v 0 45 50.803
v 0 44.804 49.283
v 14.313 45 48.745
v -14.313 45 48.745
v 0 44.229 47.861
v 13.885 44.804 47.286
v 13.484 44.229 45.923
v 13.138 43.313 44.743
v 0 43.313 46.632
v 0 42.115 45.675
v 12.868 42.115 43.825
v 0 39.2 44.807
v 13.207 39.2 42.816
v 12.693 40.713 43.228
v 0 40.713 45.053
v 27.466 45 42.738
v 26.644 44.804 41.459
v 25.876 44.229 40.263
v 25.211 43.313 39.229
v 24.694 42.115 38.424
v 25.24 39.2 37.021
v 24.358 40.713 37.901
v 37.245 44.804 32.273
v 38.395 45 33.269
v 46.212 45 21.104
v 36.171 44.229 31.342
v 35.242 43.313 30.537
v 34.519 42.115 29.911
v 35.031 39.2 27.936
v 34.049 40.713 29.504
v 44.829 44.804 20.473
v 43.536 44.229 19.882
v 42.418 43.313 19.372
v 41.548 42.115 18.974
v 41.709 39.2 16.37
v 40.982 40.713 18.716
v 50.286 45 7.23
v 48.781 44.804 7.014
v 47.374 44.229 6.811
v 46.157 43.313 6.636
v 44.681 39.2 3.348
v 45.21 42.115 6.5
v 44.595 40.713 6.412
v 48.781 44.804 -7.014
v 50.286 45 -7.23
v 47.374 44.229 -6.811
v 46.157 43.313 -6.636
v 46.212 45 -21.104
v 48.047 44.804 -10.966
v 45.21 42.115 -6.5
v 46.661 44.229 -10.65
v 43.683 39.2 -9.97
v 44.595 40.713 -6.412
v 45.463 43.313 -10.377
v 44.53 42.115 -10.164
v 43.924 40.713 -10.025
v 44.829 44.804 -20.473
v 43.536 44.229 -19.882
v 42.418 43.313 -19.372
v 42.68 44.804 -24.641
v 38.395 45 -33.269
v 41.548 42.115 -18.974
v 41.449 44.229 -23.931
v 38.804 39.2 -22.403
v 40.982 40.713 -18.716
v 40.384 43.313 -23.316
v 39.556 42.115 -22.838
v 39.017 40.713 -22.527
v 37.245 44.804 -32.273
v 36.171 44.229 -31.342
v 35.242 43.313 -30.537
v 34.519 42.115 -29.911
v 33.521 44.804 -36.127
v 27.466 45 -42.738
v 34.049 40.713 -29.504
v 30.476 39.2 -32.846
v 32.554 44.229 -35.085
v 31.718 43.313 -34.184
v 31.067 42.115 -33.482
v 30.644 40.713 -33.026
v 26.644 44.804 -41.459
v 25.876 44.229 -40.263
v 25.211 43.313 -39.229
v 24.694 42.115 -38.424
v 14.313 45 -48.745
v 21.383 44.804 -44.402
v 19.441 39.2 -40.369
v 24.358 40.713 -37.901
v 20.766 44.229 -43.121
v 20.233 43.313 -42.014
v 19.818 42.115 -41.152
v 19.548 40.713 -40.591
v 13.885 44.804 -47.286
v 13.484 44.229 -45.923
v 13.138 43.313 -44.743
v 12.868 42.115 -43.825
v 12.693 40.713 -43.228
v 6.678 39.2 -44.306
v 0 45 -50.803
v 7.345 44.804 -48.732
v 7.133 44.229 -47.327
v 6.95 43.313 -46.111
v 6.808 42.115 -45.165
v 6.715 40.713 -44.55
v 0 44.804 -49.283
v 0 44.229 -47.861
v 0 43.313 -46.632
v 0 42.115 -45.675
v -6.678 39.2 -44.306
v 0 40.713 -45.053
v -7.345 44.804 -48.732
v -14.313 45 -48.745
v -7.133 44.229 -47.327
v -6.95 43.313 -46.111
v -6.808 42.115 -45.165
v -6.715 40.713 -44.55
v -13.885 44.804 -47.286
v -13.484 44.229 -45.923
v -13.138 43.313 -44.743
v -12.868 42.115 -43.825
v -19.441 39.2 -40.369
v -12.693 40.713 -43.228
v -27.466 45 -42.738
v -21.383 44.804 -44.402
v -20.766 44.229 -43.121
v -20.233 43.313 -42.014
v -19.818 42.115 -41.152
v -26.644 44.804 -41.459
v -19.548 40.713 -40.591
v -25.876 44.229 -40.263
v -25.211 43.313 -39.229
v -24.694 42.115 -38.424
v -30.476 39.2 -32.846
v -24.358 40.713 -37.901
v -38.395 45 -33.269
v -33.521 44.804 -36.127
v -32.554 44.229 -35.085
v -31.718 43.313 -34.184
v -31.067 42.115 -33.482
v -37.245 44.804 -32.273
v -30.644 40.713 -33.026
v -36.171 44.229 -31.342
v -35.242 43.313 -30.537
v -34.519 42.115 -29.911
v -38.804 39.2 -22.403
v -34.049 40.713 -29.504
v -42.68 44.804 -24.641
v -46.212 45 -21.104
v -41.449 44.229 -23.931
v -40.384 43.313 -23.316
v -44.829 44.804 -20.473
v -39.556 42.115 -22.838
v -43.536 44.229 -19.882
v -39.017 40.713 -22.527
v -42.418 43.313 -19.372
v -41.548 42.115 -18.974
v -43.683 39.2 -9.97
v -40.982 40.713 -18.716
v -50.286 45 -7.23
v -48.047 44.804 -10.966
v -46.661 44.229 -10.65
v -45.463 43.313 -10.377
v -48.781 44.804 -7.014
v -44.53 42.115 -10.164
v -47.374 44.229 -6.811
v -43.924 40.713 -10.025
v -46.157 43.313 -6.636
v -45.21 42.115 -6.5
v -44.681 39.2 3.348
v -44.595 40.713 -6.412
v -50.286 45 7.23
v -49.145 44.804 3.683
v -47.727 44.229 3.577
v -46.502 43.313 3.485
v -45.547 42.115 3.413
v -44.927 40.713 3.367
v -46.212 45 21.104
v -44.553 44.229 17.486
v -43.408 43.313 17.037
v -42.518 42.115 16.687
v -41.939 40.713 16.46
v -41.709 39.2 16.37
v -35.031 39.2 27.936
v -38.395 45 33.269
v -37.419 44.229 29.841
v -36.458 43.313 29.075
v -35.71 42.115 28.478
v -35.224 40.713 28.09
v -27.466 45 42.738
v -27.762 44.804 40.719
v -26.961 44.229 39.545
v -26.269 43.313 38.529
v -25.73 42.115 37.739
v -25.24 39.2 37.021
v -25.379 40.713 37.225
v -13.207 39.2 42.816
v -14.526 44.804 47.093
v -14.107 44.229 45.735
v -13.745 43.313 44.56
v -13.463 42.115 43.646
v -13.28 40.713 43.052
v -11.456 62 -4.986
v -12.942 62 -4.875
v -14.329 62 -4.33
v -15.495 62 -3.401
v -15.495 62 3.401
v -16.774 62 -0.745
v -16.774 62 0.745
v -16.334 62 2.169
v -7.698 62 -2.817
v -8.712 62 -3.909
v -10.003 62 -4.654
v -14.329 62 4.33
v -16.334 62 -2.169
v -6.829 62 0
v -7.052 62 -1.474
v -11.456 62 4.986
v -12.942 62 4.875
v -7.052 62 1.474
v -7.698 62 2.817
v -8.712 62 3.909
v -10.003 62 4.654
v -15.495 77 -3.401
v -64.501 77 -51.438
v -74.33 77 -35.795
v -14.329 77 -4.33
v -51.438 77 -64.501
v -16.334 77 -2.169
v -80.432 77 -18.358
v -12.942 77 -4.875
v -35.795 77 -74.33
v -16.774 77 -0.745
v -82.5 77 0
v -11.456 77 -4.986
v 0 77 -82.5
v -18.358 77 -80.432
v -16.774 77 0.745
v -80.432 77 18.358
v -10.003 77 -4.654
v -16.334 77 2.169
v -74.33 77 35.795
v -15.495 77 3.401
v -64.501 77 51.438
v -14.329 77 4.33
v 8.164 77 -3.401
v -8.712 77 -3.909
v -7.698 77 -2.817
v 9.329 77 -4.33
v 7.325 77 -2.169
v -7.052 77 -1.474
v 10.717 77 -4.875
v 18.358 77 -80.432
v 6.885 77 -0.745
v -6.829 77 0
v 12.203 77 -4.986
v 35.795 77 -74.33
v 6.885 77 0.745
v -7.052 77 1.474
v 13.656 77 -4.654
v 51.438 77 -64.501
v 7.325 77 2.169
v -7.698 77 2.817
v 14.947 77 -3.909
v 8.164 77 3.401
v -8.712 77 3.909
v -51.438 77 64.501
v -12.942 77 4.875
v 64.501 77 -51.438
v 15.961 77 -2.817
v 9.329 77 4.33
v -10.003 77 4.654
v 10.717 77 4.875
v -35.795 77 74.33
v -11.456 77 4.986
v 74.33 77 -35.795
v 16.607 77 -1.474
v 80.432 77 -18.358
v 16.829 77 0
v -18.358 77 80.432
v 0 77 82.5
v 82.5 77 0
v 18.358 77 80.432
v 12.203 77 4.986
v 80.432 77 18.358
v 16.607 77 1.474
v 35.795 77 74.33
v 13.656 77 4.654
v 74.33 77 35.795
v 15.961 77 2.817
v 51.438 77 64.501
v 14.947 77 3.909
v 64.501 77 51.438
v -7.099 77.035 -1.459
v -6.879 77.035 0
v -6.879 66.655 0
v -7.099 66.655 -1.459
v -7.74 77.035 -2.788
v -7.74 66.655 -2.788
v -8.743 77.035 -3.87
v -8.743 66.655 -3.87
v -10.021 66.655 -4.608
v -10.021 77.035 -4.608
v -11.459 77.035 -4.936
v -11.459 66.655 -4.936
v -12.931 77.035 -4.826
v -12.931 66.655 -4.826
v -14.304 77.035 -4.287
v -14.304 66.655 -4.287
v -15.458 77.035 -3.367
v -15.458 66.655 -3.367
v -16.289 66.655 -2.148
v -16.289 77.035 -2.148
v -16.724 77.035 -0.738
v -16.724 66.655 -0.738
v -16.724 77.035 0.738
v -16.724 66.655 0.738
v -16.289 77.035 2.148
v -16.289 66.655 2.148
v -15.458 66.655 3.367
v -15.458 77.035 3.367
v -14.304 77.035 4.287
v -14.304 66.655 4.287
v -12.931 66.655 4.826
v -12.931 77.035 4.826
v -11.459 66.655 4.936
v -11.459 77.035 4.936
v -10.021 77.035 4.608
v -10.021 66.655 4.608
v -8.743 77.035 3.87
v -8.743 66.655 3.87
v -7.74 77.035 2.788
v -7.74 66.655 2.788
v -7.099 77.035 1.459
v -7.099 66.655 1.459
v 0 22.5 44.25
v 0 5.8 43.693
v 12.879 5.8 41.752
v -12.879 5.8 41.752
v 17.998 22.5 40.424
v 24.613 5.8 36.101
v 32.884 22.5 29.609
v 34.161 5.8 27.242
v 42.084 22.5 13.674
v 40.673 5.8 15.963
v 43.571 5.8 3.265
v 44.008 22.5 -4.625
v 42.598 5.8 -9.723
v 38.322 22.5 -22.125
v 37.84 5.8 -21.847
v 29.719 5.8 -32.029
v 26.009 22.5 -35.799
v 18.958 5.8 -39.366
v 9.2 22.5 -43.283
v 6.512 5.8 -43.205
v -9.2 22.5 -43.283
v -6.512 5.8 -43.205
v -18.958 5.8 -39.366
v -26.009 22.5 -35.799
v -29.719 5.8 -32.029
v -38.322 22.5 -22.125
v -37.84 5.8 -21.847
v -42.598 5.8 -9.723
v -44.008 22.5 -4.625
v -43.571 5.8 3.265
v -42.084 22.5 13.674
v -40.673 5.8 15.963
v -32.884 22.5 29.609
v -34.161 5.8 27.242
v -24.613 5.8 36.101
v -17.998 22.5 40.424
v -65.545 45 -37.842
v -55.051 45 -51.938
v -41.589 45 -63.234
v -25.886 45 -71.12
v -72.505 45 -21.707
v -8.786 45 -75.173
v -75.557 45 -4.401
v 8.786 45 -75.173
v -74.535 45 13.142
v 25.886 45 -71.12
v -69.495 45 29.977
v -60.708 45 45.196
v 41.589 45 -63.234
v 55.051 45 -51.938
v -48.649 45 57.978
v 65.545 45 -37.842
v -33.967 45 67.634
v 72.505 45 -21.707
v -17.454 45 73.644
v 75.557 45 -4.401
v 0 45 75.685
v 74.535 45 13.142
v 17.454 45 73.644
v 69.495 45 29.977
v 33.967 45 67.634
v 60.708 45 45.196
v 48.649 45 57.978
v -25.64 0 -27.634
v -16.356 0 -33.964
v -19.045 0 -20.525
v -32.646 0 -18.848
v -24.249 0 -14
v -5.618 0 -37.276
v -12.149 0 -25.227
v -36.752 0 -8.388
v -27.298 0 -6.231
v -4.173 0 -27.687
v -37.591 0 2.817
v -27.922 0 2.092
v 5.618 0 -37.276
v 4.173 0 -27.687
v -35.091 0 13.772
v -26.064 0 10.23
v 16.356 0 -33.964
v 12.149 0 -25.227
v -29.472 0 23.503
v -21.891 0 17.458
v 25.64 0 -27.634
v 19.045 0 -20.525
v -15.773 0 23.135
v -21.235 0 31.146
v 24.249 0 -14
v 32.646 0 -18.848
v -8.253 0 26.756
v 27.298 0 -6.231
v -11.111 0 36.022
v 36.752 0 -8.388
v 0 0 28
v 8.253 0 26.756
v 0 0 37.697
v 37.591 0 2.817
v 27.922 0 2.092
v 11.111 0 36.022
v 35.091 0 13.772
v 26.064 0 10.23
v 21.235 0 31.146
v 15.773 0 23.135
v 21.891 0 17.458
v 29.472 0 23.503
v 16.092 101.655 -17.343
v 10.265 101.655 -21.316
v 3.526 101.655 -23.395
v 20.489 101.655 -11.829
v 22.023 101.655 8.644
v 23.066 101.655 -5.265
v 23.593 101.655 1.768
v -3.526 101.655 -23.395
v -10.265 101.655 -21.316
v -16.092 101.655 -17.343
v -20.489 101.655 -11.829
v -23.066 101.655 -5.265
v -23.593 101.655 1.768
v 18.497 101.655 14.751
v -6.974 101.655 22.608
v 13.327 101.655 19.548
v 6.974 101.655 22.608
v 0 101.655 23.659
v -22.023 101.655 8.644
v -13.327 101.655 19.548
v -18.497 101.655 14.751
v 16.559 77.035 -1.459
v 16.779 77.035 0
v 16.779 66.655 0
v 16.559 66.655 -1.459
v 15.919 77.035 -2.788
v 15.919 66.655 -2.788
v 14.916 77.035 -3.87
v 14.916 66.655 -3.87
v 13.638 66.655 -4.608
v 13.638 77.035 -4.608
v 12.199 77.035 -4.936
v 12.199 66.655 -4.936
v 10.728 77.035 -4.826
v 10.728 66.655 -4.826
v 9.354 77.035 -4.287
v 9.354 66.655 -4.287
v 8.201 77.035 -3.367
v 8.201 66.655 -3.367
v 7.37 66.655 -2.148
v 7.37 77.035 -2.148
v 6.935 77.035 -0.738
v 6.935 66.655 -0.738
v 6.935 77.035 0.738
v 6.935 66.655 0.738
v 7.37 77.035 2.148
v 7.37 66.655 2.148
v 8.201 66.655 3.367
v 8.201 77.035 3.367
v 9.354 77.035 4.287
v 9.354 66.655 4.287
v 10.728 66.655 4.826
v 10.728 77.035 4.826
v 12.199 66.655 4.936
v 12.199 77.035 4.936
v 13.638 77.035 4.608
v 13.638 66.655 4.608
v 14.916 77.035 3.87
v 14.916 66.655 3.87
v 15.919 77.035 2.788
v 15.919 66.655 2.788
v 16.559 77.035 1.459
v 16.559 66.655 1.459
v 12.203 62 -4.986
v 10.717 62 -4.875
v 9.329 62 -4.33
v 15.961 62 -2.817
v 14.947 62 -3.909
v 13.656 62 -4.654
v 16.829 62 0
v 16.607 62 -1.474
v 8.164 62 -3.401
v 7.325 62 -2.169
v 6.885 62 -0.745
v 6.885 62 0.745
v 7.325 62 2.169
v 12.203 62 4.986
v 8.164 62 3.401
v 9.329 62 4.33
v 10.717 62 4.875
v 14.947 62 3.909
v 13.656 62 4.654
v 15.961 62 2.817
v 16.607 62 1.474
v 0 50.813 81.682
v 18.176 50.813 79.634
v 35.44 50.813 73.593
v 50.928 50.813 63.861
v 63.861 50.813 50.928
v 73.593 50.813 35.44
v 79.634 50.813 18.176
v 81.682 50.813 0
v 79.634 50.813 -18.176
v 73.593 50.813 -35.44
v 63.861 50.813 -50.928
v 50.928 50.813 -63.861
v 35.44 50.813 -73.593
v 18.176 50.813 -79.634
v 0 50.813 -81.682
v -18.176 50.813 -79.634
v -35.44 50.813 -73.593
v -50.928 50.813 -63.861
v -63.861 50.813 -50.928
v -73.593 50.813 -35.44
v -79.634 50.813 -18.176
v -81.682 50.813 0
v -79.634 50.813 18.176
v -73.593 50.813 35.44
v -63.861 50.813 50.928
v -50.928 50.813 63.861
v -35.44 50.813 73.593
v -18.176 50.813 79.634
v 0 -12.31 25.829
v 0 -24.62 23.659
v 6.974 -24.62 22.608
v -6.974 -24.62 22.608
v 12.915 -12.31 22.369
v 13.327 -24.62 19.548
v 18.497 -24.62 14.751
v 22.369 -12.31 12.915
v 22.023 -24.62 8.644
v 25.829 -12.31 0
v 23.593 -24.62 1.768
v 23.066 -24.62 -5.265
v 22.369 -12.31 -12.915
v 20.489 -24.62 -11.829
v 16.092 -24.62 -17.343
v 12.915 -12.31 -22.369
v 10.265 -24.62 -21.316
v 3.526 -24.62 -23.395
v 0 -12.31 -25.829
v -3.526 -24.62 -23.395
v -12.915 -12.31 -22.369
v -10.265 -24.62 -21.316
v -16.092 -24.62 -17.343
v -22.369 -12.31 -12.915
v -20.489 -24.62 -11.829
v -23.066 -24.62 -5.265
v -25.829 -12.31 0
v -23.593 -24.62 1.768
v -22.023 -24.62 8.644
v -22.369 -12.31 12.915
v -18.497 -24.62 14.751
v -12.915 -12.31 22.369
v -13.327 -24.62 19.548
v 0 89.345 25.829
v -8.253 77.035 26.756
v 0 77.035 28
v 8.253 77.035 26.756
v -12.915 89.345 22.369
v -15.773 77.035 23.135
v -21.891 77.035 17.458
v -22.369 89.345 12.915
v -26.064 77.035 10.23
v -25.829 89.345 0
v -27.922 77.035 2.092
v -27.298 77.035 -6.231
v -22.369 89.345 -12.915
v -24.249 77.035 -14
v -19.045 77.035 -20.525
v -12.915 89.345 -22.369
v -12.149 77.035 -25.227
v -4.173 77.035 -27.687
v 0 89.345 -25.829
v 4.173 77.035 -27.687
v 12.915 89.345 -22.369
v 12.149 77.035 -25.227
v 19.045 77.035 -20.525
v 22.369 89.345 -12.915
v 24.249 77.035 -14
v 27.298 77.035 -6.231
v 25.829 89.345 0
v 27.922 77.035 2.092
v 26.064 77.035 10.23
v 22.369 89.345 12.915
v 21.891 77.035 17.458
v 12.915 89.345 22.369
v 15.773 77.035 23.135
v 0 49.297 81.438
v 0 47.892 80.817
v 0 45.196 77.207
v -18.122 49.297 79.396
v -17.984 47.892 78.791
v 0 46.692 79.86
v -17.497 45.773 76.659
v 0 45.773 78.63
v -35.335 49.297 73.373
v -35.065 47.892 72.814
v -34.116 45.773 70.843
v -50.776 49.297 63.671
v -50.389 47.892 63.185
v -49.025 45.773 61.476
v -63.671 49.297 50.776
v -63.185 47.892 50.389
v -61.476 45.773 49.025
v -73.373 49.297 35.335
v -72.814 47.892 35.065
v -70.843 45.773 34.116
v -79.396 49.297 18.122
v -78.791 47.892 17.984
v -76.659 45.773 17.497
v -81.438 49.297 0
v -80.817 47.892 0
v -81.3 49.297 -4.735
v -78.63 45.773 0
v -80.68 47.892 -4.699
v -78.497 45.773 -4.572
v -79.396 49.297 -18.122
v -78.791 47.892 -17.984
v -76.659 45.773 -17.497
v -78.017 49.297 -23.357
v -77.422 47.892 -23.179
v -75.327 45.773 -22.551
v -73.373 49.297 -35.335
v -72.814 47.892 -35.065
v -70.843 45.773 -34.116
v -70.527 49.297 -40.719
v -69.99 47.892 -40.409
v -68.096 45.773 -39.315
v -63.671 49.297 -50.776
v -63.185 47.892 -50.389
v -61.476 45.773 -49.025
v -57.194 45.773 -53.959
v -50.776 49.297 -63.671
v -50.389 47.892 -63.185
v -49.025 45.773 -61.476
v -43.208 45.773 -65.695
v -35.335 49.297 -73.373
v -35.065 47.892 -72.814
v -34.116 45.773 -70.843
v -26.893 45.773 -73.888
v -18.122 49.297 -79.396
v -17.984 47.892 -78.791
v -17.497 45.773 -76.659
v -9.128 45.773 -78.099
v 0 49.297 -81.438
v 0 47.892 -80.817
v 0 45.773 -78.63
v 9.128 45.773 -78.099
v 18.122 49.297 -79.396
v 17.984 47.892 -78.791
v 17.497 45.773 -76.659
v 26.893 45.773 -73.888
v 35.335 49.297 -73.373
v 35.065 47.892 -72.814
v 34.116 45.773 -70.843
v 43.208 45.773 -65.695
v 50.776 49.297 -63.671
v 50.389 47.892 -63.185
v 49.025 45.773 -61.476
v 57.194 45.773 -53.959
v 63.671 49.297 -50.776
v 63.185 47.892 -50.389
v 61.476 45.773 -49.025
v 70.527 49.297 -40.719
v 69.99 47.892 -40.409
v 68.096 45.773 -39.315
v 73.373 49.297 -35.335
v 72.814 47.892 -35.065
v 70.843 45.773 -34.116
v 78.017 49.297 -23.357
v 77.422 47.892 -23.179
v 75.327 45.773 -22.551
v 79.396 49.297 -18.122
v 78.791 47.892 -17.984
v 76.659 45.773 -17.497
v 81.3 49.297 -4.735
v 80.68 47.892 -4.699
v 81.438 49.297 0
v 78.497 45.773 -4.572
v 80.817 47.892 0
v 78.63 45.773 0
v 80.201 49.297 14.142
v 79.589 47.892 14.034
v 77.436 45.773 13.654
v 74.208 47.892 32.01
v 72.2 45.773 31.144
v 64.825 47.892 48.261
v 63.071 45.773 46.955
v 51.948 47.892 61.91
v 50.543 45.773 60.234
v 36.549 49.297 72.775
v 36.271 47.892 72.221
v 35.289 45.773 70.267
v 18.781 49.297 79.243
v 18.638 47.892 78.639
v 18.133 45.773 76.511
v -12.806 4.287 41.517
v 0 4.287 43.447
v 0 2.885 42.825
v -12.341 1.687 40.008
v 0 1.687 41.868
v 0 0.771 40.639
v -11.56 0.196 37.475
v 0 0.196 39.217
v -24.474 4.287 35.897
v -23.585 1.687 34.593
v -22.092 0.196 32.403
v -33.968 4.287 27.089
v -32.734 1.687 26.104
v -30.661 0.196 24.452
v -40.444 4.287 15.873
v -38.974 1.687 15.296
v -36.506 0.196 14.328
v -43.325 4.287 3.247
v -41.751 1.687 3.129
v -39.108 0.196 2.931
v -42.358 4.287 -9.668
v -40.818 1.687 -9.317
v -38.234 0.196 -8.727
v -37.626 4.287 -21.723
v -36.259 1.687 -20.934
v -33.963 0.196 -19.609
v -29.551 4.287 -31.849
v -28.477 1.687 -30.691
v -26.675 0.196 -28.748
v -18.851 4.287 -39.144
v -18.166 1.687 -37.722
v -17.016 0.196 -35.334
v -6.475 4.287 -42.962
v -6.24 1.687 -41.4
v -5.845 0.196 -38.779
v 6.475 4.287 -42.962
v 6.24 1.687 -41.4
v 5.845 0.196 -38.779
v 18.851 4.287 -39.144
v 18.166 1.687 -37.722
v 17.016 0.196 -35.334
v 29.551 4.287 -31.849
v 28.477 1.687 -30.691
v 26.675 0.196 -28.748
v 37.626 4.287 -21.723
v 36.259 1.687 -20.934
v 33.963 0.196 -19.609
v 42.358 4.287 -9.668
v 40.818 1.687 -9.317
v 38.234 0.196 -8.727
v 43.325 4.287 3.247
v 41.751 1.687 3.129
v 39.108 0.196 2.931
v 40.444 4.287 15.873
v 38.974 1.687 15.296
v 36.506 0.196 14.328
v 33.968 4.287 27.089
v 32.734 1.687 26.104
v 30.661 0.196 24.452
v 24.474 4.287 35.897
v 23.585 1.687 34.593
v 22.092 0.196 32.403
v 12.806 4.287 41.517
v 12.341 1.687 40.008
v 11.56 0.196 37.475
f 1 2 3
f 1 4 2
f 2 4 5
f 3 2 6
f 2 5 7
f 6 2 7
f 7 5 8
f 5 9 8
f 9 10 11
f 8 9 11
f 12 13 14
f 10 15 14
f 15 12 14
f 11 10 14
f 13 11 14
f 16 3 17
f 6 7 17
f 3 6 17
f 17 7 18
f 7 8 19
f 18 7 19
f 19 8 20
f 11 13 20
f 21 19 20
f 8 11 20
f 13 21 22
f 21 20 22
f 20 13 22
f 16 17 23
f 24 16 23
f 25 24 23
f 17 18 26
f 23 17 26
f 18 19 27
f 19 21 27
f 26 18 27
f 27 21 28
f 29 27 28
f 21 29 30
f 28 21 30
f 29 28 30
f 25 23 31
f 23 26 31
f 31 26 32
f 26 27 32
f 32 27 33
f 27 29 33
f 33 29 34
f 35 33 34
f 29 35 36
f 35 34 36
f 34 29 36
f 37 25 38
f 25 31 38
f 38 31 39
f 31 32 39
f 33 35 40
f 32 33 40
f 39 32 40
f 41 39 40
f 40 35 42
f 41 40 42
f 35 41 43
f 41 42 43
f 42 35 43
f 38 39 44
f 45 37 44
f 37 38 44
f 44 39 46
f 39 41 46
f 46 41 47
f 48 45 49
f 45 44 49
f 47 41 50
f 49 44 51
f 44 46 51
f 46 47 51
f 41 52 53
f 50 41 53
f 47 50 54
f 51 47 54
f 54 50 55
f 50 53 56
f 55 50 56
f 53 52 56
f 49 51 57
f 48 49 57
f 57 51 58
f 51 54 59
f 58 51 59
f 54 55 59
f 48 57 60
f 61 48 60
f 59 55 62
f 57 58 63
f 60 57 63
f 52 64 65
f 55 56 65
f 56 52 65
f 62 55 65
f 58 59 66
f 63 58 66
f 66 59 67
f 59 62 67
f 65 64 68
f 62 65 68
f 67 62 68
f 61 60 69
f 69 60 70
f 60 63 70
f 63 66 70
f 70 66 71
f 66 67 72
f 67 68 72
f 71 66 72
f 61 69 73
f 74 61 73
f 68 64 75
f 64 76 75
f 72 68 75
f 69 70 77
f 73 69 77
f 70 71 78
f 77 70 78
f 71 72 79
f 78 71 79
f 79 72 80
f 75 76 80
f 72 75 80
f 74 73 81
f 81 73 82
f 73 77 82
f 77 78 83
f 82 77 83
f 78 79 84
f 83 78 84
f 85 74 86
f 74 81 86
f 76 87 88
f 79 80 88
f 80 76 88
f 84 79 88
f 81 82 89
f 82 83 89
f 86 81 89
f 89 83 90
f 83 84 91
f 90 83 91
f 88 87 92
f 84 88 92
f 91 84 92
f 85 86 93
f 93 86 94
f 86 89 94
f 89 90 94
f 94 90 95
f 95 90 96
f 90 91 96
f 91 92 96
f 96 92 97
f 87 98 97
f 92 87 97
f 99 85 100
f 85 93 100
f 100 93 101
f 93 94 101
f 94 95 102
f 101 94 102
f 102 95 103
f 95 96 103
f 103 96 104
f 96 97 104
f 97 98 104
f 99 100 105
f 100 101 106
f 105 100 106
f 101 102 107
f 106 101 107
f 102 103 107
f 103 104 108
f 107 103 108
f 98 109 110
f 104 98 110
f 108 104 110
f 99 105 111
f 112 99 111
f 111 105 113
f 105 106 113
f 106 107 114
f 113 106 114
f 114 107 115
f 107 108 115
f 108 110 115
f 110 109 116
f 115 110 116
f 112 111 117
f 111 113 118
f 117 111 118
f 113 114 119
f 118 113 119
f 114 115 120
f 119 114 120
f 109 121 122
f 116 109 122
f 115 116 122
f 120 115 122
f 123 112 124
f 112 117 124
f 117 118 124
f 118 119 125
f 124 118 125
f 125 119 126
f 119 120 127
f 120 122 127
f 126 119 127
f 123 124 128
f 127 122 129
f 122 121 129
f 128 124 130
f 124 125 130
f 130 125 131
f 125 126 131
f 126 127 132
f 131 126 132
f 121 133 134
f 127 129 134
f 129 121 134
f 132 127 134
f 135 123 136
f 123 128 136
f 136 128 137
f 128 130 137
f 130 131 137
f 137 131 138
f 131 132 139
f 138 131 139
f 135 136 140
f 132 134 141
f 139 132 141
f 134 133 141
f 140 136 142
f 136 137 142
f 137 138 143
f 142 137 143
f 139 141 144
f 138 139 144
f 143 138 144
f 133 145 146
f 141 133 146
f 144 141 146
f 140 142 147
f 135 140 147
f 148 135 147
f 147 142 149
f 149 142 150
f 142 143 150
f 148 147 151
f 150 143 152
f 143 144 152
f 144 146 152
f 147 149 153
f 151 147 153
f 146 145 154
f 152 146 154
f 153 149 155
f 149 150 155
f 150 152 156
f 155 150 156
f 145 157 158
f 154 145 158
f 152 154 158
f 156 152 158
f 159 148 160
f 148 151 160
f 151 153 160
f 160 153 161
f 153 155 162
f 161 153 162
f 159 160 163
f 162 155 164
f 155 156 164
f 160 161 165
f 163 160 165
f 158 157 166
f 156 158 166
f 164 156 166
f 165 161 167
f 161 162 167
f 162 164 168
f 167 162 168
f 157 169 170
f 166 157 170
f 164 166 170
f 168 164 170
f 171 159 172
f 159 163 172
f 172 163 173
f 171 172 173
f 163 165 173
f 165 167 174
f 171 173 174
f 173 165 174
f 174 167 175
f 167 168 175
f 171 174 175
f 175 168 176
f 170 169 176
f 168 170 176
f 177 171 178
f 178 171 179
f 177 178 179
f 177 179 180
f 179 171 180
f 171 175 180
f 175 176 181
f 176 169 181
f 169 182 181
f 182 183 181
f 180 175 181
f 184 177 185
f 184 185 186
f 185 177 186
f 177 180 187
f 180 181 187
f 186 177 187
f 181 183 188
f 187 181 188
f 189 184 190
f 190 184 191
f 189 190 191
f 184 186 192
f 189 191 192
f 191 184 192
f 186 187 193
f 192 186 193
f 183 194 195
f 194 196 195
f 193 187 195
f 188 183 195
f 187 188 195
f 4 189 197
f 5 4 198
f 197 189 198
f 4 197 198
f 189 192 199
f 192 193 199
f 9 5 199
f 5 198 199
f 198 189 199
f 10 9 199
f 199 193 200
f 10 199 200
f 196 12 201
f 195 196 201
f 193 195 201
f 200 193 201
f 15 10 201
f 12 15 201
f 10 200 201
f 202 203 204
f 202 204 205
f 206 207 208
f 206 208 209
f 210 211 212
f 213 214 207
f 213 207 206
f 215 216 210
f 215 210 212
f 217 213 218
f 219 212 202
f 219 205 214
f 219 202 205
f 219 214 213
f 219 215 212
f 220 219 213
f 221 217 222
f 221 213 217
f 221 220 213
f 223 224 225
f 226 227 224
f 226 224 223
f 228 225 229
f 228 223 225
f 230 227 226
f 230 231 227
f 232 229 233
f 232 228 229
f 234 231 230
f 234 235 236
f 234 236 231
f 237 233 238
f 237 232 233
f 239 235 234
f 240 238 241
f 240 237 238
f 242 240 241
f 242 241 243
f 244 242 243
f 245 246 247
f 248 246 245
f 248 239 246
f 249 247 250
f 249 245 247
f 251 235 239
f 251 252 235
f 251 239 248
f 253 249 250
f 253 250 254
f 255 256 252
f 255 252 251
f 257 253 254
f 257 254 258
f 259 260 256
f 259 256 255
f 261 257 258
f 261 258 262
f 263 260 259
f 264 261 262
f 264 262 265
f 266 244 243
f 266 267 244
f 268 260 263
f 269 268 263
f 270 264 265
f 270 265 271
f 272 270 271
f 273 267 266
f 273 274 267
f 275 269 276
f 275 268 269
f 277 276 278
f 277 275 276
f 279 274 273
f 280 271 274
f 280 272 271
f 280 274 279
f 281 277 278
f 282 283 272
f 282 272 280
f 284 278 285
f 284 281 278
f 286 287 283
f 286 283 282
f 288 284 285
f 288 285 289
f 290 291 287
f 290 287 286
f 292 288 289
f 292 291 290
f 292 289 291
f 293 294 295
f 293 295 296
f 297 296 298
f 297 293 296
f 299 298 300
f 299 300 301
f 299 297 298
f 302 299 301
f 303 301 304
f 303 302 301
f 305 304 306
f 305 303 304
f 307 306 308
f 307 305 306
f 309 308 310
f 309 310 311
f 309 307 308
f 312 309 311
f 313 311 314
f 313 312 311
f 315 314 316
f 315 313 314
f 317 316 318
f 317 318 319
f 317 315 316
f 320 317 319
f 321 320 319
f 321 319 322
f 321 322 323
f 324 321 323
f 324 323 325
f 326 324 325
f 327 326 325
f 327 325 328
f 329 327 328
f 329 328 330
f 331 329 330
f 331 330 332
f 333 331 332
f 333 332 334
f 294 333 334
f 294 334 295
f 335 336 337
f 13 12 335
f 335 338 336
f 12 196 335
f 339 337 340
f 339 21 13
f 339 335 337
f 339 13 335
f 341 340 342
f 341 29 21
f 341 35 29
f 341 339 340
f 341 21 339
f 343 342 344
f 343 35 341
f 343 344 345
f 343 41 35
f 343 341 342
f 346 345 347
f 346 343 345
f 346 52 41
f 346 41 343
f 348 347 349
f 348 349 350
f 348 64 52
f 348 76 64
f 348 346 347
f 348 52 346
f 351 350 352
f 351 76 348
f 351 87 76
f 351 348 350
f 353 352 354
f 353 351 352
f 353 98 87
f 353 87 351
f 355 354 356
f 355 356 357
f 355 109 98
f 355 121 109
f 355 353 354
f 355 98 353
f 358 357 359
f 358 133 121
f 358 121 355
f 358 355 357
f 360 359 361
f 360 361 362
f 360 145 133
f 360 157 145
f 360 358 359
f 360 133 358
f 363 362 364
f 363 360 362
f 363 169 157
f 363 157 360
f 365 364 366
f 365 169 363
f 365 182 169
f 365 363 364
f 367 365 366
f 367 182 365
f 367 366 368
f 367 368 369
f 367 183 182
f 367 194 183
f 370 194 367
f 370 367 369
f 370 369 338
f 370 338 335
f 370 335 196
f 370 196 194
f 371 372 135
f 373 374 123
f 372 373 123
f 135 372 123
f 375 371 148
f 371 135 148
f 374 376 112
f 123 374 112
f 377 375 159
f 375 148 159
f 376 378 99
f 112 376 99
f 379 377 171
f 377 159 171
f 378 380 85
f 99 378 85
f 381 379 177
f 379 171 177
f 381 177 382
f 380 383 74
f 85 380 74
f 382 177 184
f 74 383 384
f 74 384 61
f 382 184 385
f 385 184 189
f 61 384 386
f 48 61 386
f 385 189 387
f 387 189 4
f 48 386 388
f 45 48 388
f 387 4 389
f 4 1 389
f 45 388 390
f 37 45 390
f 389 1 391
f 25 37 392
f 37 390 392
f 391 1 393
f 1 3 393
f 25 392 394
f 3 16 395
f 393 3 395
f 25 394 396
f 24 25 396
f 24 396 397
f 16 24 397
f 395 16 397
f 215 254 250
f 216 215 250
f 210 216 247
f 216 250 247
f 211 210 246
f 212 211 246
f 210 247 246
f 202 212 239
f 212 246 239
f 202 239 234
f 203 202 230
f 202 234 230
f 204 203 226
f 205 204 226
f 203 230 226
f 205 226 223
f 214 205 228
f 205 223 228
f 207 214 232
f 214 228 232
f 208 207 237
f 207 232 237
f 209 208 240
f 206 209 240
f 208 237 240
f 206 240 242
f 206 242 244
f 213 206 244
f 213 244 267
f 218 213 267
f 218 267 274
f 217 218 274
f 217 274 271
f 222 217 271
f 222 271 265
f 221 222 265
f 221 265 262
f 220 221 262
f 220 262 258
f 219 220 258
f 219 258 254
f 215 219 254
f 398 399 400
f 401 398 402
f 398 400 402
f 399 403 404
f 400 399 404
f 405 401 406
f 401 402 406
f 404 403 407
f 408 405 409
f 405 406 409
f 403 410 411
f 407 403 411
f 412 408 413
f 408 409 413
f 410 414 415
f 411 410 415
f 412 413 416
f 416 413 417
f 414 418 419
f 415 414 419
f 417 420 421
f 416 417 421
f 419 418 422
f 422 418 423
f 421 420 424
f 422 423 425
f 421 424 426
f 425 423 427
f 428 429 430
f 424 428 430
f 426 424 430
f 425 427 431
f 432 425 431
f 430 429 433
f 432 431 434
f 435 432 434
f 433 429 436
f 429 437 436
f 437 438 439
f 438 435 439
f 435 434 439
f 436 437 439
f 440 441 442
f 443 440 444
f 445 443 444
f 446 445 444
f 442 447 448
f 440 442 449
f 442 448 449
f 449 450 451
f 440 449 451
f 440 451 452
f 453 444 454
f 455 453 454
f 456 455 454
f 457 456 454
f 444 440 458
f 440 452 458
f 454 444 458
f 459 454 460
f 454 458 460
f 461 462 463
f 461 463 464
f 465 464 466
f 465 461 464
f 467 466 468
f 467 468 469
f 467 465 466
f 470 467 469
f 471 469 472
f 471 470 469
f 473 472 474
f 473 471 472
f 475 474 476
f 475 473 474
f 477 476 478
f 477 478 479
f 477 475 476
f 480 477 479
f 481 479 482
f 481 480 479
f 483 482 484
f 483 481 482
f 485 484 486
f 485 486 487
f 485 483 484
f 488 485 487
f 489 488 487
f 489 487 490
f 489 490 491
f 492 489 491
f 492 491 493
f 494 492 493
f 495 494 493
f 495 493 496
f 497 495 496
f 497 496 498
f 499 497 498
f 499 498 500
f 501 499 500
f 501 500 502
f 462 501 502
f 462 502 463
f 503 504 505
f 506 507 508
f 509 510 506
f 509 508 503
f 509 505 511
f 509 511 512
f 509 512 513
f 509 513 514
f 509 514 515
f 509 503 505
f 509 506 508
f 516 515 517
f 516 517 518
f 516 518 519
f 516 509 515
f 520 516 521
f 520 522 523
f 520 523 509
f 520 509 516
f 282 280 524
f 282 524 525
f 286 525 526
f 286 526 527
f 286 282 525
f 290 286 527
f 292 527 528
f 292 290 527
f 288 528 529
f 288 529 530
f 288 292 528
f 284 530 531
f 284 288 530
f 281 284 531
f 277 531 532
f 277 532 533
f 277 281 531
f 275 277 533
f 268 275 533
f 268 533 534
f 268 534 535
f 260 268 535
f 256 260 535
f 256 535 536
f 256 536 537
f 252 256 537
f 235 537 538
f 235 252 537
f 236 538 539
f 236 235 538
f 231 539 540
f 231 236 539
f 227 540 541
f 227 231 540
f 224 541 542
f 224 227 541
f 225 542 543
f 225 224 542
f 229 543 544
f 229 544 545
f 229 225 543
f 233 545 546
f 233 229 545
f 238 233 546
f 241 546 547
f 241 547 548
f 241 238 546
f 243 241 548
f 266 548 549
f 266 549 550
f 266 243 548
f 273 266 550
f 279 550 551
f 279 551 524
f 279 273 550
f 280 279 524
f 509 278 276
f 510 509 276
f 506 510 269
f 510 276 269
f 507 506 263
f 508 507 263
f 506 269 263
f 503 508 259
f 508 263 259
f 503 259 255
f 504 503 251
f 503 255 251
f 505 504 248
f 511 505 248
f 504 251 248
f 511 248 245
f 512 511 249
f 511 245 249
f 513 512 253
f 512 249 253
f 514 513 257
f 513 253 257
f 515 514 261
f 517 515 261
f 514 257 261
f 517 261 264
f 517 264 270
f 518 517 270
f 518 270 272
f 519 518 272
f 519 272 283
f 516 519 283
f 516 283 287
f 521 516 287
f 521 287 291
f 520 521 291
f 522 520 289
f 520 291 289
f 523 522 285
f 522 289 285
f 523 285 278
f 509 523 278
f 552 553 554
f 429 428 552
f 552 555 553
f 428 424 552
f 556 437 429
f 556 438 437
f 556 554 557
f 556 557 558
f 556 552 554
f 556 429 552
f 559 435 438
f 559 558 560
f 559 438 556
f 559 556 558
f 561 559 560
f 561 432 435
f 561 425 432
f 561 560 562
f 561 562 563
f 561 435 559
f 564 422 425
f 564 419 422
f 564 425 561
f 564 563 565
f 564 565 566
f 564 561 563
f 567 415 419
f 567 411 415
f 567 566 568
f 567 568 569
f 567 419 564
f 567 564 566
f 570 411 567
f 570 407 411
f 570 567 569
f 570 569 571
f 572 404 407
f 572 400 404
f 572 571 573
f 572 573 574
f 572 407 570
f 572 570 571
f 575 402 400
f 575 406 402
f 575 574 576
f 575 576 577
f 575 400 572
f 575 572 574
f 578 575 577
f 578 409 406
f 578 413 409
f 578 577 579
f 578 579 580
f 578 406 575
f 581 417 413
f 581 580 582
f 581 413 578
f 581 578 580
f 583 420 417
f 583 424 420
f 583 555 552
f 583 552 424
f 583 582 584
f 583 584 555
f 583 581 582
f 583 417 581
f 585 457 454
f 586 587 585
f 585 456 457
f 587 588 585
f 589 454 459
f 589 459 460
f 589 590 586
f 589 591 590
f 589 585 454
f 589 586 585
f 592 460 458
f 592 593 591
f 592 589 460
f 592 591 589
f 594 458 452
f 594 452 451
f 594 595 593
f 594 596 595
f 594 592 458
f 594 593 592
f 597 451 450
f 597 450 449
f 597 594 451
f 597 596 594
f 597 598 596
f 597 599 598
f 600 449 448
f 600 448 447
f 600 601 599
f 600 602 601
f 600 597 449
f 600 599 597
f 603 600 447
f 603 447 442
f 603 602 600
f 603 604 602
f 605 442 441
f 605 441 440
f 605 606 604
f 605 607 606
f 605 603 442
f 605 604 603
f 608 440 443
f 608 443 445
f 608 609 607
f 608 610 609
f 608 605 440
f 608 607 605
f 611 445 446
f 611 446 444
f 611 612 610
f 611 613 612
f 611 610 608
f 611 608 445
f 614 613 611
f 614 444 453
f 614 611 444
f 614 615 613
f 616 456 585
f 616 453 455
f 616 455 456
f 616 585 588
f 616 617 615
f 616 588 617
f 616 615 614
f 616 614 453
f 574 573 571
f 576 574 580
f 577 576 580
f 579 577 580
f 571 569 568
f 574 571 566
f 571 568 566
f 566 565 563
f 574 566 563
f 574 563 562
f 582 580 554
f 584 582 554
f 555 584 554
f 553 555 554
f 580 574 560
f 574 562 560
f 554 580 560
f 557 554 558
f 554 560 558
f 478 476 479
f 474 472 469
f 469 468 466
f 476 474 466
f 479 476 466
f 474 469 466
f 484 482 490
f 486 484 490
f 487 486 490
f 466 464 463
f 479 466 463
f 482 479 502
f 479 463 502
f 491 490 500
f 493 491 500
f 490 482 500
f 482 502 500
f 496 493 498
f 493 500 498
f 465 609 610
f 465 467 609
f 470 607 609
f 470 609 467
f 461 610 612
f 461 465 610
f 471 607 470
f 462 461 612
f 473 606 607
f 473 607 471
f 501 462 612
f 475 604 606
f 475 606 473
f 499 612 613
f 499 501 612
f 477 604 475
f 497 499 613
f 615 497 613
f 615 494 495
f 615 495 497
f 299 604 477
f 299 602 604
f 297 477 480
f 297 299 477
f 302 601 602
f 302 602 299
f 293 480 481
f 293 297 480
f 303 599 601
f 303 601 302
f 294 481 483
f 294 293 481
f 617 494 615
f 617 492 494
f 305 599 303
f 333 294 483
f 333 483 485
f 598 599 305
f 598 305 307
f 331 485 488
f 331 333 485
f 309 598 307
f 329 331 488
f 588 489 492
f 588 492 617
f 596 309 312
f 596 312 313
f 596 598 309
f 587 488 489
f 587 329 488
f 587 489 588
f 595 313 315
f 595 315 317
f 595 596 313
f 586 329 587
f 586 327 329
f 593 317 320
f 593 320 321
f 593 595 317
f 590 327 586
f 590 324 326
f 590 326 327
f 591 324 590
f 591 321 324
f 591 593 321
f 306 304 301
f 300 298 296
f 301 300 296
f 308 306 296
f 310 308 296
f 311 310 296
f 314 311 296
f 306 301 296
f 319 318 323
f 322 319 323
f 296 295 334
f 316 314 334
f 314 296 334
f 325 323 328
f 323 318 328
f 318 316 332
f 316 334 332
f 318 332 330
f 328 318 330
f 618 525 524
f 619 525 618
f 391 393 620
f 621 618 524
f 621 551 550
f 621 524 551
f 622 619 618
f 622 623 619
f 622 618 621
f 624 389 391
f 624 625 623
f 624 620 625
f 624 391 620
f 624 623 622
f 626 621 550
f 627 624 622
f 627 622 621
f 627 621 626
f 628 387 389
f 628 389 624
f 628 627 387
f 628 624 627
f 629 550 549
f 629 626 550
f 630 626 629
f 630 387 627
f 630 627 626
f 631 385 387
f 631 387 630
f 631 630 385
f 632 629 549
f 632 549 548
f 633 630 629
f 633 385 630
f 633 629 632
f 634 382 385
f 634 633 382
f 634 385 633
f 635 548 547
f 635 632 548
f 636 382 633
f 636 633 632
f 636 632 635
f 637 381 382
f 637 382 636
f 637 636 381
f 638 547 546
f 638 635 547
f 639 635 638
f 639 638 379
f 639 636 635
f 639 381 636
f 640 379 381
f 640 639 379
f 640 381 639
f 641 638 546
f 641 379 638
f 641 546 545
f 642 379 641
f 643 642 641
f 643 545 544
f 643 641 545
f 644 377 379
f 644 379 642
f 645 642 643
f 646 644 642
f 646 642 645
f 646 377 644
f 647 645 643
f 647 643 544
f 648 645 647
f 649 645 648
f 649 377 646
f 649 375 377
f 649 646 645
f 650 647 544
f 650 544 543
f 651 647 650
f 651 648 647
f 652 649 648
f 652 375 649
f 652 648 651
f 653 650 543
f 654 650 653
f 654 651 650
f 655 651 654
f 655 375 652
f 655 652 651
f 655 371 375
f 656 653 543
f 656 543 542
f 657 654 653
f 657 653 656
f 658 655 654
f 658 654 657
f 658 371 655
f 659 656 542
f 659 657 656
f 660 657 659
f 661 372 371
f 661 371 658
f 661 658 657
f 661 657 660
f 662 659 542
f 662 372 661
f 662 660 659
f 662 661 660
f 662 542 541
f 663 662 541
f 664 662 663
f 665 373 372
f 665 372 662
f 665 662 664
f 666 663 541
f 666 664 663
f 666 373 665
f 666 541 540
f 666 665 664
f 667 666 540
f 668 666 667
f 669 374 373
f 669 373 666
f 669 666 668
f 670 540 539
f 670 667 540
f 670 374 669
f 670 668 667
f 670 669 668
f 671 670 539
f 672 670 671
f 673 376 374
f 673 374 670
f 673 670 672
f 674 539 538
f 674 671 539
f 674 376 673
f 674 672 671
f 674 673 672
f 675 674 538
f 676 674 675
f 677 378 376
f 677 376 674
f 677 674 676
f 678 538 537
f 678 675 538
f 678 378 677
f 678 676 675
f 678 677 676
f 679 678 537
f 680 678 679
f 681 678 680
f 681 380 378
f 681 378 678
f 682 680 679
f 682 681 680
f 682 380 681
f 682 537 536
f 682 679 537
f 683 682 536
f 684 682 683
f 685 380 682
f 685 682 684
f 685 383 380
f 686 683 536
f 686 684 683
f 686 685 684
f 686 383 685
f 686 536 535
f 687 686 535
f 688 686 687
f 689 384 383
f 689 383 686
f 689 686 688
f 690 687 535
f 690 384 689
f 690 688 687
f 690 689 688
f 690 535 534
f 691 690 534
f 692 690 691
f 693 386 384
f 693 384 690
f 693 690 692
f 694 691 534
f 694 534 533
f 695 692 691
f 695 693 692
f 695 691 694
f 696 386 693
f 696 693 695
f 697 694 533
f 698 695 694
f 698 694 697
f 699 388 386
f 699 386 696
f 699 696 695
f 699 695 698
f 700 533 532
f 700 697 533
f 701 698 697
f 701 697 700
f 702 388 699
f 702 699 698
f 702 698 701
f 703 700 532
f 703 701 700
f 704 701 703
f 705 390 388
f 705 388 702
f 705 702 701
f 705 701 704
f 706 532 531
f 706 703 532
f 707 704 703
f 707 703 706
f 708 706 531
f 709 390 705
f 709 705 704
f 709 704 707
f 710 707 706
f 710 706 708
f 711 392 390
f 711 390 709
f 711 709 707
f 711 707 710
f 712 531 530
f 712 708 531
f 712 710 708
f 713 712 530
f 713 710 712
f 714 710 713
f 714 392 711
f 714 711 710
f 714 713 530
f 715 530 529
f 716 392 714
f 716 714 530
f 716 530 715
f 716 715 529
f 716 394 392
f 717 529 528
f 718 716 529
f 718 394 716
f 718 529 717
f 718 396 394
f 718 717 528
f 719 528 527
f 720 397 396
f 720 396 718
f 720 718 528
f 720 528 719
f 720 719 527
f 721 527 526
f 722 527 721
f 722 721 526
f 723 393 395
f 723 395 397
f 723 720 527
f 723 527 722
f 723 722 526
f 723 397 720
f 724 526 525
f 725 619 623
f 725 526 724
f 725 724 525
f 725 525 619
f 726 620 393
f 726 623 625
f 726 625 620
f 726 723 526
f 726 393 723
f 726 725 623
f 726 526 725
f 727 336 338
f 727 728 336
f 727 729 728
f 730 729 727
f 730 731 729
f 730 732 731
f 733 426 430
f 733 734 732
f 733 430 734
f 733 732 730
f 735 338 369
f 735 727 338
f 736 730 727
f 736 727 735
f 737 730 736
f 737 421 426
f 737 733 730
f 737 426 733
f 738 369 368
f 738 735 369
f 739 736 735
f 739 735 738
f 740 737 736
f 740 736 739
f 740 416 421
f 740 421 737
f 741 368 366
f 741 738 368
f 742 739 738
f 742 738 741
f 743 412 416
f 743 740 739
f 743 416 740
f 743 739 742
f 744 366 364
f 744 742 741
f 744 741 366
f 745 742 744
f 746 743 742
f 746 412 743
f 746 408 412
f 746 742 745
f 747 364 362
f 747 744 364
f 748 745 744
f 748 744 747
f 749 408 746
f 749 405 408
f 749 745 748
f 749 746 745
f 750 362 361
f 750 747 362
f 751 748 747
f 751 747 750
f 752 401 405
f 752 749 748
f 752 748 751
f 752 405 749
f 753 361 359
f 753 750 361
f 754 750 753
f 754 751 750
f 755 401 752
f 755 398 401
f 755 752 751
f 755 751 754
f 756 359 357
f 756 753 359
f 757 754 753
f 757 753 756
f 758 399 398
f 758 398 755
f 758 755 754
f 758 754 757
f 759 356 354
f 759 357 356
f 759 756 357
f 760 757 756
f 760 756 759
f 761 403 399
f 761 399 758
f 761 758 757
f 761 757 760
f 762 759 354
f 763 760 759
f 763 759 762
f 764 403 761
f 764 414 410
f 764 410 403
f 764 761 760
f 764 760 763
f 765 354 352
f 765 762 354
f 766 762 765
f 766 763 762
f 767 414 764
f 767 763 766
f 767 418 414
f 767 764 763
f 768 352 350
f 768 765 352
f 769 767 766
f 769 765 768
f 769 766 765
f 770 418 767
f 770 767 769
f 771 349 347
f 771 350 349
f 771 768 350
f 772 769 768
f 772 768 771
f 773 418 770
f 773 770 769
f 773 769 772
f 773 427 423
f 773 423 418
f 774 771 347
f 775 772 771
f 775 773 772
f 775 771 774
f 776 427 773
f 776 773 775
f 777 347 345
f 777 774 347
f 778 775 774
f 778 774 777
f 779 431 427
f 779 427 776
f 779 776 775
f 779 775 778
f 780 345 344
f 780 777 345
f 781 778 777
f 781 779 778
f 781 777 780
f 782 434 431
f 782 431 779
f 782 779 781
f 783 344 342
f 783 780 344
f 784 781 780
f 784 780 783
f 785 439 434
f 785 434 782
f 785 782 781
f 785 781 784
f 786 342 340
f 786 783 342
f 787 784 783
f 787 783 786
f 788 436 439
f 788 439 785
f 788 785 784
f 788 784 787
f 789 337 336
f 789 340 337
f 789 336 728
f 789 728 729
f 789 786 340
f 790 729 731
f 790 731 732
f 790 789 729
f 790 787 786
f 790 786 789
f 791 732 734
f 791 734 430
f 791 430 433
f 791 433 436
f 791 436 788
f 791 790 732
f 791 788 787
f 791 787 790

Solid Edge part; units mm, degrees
sketch "Sketch1" plane through (0, 0, 0) normal (1, 0, 0) x (0, 1, 0)
  line L0 (77, 0) -> (77, 82.5)
  line L1 (45, 81.5) -> (77, 82.5)
  line L2 (45, 81.5) -> (45, 45)
  line L3 (45, 45) -> (0, 43.5)
  line L4 (0, 43.5) -> (0, 0)
  dimension "D1" = 43.5
  dimension "D2" = 77
  dimension "D3" = 82.5
  dimension "D4" = 32.0156
  dimension "D5" = 36.5
  dimension "D6" = 45.025
revolve "RevolvedProtrusion1" add sketch "Sketch1" angle 360 about axis through (0, 0, 0) along (0, 1, 0)
sketch "Sketch2" plane through (0, 0, 0) normal (-1, 0, 0) x (0, -1, 0)
  line L0 (0, 28) -> (24.6202, 23.6588)
  line L1 (24.6202, 23.6588) -> (24.6202, 0)
  line L2 (0, 28) -> (0, 0)
revolve "RevolvedProtrusion2" add sketch "Sketch2" angle 360 about axis through (0, -24.6202, 0) along (0, 1, 0)
sketch "Sketch3" plane through (0, 0, 0) normal (-1, 0, 0) x (0, -1, 0)
  line L0 (-77.0346, 0) -> (-77.0346, 28)
  line L1 (-77.0346, 28) -> (-101.6548, 23.6588)
  line L2 (-101.6548, 23.6588) -> (-101.6548, 0)
revolve "RevolvedProtrusion3" add sketch "Sketch3" angle 360 about axis through (0, 101.6548, 0) along (0, -1, 0)
sketch "Sketch4" plane through (0, 77, 0) normal (0, 1, 0) x (1, 0, 0)
  circle A0 centre (-11.8294, 0) radius 5
  circle A1 centre (11.8294, 0) radius 5
extrude "Fori_spine" cut sketch "Sketch4" against normal blind 15
fillet "Raccordi" radius 6 3 edges at (0, 0, 43.5) (0, 45, 45) (0, 45, 81.5)
sketch "Sketch5" plane through (0, 101.6548, 0) normal (0, 1, 0) x (1, 0, 0)
  circle A0 centre (-11.8294, 0) radius 4.95
  circle A1 centre (11.8294, 0) radius 4.95
extrude "Spine" add sketch "Sketch5" against normal blind 35
properties material "Acciaio"
